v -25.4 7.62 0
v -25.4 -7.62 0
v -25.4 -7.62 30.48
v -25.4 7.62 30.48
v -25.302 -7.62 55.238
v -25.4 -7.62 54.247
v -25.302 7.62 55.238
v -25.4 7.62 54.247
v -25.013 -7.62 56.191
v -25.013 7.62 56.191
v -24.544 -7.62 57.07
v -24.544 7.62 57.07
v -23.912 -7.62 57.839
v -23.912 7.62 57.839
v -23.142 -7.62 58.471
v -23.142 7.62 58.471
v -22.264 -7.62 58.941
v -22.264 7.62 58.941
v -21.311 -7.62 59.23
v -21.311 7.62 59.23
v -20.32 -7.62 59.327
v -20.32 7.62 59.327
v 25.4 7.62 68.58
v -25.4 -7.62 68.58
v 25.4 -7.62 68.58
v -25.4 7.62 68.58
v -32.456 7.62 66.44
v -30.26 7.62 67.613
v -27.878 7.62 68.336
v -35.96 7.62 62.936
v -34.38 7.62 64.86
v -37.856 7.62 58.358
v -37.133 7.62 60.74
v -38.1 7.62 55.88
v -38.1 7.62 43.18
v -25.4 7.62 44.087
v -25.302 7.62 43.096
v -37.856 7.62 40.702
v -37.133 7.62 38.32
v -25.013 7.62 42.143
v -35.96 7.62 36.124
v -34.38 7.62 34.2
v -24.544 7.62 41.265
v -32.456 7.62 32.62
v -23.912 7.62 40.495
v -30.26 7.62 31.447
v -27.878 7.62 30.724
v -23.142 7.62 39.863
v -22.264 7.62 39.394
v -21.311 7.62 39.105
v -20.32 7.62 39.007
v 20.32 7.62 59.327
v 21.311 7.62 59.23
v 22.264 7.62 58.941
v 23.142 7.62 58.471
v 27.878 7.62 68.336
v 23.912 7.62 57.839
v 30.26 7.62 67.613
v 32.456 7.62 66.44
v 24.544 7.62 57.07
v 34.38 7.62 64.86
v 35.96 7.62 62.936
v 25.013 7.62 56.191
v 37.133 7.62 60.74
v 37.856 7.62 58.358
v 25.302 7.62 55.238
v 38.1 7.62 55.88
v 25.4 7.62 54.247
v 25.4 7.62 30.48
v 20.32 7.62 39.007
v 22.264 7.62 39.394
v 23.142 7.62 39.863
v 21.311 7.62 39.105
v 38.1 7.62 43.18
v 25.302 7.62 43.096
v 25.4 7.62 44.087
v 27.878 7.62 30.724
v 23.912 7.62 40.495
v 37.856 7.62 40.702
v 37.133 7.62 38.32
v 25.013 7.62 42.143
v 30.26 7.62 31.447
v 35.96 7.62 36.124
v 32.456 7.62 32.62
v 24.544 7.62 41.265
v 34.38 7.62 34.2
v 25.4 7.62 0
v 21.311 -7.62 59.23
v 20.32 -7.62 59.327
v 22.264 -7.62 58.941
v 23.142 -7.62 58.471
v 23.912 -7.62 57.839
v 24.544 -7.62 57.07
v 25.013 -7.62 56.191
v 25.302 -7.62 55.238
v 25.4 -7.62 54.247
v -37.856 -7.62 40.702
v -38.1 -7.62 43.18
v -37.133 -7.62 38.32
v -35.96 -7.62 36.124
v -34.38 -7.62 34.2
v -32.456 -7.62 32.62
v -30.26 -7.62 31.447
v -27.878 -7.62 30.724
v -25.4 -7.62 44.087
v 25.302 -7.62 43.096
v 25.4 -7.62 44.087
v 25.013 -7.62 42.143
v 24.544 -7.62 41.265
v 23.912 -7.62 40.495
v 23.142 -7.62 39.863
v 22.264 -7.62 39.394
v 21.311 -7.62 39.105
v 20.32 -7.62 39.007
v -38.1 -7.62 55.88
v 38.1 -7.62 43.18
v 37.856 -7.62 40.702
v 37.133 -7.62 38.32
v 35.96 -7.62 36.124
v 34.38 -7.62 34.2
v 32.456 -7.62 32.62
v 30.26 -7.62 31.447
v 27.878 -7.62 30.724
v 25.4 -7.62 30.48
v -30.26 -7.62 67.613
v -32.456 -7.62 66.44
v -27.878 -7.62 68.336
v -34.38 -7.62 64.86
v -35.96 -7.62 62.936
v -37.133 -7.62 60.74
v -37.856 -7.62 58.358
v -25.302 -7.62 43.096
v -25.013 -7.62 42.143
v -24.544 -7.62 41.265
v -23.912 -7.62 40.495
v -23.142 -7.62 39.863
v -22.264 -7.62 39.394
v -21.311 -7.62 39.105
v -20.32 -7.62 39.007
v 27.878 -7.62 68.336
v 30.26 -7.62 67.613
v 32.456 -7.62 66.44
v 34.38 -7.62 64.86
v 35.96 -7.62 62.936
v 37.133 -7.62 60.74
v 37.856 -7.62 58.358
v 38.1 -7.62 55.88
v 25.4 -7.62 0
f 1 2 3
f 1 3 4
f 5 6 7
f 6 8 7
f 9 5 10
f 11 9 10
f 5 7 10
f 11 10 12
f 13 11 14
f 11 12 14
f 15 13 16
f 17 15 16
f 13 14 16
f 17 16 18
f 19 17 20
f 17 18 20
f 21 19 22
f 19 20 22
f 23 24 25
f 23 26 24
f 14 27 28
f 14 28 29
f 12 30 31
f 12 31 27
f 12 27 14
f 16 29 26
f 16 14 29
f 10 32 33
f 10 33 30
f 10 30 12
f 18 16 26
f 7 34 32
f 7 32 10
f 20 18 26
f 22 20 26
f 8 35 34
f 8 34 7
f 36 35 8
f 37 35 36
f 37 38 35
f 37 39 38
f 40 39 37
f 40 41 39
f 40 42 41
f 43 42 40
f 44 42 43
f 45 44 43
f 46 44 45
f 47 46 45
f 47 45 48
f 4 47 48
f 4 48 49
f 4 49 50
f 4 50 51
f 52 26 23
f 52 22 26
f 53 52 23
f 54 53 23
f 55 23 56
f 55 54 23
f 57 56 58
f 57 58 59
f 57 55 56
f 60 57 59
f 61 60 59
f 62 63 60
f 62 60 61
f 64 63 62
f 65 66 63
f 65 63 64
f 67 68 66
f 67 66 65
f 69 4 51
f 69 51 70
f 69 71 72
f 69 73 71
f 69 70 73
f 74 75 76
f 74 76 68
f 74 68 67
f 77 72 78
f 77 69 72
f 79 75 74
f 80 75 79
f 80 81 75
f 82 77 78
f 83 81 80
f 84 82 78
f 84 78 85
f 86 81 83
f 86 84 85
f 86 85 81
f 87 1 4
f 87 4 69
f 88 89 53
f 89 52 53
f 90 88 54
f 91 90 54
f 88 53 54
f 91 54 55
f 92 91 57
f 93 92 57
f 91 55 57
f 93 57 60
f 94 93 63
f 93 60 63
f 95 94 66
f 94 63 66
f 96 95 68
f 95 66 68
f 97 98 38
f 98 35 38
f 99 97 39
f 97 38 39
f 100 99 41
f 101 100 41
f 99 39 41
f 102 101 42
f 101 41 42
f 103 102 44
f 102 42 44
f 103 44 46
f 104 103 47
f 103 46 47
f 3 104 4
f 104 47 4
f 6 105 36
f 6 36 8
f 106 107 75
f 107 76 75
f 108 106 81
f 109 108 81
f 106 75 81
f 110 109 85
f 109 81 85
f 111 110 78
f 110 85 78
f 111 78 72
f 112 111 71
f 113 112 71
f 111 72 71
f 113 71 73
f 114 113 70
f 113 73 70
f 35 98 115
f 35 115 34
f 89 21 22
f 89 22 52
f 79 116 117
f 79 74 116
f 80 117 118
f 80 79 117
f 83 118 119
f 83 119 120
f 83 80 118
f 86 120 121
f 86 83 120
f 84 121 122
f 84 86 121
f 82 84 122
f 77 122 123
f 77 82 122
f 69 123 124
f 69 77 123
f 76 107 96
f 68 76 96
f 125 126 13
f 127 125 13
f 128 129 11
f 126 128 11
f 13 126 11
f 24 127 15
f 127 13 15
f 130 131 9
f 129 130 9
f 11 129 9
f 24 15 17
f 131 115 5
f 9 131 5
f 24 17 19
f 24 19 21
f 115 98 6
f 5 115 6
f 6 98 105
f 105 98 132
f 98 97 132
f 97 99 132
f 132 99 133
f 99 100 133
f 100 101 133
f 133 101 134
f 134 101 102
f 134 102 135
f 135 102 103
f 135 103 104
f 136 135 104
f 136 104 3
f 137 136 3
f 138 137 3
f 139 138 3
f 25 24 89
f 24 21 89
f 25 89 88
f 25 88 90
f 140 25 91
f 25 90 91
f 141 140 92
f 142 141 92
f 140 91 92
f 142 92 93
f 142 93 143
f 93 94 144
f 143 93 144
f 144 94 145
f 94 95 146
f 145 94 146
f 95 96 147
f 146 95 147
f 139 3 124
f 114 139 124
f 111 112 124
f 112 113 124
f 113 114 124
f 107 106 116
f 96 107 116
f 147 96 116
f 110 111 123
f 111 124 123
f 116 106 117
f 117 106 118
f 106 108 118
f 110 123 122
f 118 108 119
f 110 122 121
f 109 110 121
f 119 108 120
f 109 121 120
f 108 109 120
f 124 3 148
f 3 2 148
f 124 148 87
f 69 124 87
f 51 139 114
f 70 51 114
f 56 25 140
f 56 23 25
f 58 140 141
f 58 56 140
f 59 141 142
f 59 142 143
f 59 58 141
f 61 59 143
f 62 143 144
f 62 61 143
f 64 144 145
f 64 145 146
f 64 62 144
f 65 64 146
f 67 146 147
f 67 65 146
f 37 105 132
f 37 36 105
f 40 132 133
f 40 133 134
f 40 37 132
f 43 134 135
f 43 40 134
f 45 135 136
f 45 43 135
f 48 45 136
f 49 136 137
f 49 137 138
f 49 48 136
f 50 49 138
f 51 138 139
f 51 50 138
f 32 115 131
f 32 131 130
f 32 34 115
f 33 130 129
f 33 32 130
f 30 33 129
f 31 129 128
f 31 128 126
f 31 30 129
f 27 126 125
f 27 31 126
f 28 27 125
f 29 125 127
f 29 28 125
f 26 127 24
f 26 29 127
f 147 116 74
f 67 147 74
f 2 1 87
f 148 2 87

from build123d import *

# Parameters (mm, degrees)
SKETCH1_W           = 50.8
SKETCH1_H           = 15.24
BOSS_EXTRUDE2_DEPTH = 30.48
SKETCH2_W           = 76.2
SKETCH2_H           = 15.24
BOSS_EXTRUDE3_DEPTH = 38.1
SKETCH3_W           = 50.8
SKETCH3_H           = 20.32
CUT_EXTRUDE1_DEPTH  = 80.919234231
FILLET1_R           = 5.08
FILLET4_R           = 12.7


with BuildPart() as part:
    # Sketch1 → Boss-Extrude2 (new body)
    with BuildSketch(Plane.XY):
        Rectangle(SKETCH1_W, SKETCH1_H)
    extrude(amount=BOSS_EXTRUDE2_DEPTH)

    # Sketch2 → Boss-Extrude3 (add)
    with BuildSketch(Plane.XY.offset(30.48)):
        Rectangle(SKETCH2_W, SKETCH2_H)
    extrude(amount=BOSS_EXTRUDE3_DEPTH)

    # Sketch3 → Cut-Extrude1 (cut, through all)
    with BuildSketch(Plane.XZ.offset(7.62)):
        with Locations((0, 49.167262881)):
            Rectangle(SKETCH3_W, SKETCH3_H)
    extrude(amount=-CUT_EXTRUDE1_DEPTH, mode=Mode.SUBTRACT)

    # Fillet1
    fillet1_edges = [part.edges().sort_by_distance(p)[0] for p in [
        (-25.4, 0, 39.007262881),
        (-25.4, 0, 59.327262881),
        (25.4, 0, 59.327262881),
        (25.4, 0, 39.007262881),
    ]]
    fillet(fillet1_edges, radius=FILLET1_R)

    # Fillet4
    fillet4_edges = [part.edges().sort_by_distance(p)[0] for p in [
        (38.1, 0, 30.48),
        (38.1, 0, 68.58),
        (-38.1, 0, 30.48),
        (-38.1, 0, 68.58),
    ]]
    fillet(fillet4_edges, radius=FILLET4_R - 0.0001)  # a hair under: the kernel refuses the full size


solid = part.part
